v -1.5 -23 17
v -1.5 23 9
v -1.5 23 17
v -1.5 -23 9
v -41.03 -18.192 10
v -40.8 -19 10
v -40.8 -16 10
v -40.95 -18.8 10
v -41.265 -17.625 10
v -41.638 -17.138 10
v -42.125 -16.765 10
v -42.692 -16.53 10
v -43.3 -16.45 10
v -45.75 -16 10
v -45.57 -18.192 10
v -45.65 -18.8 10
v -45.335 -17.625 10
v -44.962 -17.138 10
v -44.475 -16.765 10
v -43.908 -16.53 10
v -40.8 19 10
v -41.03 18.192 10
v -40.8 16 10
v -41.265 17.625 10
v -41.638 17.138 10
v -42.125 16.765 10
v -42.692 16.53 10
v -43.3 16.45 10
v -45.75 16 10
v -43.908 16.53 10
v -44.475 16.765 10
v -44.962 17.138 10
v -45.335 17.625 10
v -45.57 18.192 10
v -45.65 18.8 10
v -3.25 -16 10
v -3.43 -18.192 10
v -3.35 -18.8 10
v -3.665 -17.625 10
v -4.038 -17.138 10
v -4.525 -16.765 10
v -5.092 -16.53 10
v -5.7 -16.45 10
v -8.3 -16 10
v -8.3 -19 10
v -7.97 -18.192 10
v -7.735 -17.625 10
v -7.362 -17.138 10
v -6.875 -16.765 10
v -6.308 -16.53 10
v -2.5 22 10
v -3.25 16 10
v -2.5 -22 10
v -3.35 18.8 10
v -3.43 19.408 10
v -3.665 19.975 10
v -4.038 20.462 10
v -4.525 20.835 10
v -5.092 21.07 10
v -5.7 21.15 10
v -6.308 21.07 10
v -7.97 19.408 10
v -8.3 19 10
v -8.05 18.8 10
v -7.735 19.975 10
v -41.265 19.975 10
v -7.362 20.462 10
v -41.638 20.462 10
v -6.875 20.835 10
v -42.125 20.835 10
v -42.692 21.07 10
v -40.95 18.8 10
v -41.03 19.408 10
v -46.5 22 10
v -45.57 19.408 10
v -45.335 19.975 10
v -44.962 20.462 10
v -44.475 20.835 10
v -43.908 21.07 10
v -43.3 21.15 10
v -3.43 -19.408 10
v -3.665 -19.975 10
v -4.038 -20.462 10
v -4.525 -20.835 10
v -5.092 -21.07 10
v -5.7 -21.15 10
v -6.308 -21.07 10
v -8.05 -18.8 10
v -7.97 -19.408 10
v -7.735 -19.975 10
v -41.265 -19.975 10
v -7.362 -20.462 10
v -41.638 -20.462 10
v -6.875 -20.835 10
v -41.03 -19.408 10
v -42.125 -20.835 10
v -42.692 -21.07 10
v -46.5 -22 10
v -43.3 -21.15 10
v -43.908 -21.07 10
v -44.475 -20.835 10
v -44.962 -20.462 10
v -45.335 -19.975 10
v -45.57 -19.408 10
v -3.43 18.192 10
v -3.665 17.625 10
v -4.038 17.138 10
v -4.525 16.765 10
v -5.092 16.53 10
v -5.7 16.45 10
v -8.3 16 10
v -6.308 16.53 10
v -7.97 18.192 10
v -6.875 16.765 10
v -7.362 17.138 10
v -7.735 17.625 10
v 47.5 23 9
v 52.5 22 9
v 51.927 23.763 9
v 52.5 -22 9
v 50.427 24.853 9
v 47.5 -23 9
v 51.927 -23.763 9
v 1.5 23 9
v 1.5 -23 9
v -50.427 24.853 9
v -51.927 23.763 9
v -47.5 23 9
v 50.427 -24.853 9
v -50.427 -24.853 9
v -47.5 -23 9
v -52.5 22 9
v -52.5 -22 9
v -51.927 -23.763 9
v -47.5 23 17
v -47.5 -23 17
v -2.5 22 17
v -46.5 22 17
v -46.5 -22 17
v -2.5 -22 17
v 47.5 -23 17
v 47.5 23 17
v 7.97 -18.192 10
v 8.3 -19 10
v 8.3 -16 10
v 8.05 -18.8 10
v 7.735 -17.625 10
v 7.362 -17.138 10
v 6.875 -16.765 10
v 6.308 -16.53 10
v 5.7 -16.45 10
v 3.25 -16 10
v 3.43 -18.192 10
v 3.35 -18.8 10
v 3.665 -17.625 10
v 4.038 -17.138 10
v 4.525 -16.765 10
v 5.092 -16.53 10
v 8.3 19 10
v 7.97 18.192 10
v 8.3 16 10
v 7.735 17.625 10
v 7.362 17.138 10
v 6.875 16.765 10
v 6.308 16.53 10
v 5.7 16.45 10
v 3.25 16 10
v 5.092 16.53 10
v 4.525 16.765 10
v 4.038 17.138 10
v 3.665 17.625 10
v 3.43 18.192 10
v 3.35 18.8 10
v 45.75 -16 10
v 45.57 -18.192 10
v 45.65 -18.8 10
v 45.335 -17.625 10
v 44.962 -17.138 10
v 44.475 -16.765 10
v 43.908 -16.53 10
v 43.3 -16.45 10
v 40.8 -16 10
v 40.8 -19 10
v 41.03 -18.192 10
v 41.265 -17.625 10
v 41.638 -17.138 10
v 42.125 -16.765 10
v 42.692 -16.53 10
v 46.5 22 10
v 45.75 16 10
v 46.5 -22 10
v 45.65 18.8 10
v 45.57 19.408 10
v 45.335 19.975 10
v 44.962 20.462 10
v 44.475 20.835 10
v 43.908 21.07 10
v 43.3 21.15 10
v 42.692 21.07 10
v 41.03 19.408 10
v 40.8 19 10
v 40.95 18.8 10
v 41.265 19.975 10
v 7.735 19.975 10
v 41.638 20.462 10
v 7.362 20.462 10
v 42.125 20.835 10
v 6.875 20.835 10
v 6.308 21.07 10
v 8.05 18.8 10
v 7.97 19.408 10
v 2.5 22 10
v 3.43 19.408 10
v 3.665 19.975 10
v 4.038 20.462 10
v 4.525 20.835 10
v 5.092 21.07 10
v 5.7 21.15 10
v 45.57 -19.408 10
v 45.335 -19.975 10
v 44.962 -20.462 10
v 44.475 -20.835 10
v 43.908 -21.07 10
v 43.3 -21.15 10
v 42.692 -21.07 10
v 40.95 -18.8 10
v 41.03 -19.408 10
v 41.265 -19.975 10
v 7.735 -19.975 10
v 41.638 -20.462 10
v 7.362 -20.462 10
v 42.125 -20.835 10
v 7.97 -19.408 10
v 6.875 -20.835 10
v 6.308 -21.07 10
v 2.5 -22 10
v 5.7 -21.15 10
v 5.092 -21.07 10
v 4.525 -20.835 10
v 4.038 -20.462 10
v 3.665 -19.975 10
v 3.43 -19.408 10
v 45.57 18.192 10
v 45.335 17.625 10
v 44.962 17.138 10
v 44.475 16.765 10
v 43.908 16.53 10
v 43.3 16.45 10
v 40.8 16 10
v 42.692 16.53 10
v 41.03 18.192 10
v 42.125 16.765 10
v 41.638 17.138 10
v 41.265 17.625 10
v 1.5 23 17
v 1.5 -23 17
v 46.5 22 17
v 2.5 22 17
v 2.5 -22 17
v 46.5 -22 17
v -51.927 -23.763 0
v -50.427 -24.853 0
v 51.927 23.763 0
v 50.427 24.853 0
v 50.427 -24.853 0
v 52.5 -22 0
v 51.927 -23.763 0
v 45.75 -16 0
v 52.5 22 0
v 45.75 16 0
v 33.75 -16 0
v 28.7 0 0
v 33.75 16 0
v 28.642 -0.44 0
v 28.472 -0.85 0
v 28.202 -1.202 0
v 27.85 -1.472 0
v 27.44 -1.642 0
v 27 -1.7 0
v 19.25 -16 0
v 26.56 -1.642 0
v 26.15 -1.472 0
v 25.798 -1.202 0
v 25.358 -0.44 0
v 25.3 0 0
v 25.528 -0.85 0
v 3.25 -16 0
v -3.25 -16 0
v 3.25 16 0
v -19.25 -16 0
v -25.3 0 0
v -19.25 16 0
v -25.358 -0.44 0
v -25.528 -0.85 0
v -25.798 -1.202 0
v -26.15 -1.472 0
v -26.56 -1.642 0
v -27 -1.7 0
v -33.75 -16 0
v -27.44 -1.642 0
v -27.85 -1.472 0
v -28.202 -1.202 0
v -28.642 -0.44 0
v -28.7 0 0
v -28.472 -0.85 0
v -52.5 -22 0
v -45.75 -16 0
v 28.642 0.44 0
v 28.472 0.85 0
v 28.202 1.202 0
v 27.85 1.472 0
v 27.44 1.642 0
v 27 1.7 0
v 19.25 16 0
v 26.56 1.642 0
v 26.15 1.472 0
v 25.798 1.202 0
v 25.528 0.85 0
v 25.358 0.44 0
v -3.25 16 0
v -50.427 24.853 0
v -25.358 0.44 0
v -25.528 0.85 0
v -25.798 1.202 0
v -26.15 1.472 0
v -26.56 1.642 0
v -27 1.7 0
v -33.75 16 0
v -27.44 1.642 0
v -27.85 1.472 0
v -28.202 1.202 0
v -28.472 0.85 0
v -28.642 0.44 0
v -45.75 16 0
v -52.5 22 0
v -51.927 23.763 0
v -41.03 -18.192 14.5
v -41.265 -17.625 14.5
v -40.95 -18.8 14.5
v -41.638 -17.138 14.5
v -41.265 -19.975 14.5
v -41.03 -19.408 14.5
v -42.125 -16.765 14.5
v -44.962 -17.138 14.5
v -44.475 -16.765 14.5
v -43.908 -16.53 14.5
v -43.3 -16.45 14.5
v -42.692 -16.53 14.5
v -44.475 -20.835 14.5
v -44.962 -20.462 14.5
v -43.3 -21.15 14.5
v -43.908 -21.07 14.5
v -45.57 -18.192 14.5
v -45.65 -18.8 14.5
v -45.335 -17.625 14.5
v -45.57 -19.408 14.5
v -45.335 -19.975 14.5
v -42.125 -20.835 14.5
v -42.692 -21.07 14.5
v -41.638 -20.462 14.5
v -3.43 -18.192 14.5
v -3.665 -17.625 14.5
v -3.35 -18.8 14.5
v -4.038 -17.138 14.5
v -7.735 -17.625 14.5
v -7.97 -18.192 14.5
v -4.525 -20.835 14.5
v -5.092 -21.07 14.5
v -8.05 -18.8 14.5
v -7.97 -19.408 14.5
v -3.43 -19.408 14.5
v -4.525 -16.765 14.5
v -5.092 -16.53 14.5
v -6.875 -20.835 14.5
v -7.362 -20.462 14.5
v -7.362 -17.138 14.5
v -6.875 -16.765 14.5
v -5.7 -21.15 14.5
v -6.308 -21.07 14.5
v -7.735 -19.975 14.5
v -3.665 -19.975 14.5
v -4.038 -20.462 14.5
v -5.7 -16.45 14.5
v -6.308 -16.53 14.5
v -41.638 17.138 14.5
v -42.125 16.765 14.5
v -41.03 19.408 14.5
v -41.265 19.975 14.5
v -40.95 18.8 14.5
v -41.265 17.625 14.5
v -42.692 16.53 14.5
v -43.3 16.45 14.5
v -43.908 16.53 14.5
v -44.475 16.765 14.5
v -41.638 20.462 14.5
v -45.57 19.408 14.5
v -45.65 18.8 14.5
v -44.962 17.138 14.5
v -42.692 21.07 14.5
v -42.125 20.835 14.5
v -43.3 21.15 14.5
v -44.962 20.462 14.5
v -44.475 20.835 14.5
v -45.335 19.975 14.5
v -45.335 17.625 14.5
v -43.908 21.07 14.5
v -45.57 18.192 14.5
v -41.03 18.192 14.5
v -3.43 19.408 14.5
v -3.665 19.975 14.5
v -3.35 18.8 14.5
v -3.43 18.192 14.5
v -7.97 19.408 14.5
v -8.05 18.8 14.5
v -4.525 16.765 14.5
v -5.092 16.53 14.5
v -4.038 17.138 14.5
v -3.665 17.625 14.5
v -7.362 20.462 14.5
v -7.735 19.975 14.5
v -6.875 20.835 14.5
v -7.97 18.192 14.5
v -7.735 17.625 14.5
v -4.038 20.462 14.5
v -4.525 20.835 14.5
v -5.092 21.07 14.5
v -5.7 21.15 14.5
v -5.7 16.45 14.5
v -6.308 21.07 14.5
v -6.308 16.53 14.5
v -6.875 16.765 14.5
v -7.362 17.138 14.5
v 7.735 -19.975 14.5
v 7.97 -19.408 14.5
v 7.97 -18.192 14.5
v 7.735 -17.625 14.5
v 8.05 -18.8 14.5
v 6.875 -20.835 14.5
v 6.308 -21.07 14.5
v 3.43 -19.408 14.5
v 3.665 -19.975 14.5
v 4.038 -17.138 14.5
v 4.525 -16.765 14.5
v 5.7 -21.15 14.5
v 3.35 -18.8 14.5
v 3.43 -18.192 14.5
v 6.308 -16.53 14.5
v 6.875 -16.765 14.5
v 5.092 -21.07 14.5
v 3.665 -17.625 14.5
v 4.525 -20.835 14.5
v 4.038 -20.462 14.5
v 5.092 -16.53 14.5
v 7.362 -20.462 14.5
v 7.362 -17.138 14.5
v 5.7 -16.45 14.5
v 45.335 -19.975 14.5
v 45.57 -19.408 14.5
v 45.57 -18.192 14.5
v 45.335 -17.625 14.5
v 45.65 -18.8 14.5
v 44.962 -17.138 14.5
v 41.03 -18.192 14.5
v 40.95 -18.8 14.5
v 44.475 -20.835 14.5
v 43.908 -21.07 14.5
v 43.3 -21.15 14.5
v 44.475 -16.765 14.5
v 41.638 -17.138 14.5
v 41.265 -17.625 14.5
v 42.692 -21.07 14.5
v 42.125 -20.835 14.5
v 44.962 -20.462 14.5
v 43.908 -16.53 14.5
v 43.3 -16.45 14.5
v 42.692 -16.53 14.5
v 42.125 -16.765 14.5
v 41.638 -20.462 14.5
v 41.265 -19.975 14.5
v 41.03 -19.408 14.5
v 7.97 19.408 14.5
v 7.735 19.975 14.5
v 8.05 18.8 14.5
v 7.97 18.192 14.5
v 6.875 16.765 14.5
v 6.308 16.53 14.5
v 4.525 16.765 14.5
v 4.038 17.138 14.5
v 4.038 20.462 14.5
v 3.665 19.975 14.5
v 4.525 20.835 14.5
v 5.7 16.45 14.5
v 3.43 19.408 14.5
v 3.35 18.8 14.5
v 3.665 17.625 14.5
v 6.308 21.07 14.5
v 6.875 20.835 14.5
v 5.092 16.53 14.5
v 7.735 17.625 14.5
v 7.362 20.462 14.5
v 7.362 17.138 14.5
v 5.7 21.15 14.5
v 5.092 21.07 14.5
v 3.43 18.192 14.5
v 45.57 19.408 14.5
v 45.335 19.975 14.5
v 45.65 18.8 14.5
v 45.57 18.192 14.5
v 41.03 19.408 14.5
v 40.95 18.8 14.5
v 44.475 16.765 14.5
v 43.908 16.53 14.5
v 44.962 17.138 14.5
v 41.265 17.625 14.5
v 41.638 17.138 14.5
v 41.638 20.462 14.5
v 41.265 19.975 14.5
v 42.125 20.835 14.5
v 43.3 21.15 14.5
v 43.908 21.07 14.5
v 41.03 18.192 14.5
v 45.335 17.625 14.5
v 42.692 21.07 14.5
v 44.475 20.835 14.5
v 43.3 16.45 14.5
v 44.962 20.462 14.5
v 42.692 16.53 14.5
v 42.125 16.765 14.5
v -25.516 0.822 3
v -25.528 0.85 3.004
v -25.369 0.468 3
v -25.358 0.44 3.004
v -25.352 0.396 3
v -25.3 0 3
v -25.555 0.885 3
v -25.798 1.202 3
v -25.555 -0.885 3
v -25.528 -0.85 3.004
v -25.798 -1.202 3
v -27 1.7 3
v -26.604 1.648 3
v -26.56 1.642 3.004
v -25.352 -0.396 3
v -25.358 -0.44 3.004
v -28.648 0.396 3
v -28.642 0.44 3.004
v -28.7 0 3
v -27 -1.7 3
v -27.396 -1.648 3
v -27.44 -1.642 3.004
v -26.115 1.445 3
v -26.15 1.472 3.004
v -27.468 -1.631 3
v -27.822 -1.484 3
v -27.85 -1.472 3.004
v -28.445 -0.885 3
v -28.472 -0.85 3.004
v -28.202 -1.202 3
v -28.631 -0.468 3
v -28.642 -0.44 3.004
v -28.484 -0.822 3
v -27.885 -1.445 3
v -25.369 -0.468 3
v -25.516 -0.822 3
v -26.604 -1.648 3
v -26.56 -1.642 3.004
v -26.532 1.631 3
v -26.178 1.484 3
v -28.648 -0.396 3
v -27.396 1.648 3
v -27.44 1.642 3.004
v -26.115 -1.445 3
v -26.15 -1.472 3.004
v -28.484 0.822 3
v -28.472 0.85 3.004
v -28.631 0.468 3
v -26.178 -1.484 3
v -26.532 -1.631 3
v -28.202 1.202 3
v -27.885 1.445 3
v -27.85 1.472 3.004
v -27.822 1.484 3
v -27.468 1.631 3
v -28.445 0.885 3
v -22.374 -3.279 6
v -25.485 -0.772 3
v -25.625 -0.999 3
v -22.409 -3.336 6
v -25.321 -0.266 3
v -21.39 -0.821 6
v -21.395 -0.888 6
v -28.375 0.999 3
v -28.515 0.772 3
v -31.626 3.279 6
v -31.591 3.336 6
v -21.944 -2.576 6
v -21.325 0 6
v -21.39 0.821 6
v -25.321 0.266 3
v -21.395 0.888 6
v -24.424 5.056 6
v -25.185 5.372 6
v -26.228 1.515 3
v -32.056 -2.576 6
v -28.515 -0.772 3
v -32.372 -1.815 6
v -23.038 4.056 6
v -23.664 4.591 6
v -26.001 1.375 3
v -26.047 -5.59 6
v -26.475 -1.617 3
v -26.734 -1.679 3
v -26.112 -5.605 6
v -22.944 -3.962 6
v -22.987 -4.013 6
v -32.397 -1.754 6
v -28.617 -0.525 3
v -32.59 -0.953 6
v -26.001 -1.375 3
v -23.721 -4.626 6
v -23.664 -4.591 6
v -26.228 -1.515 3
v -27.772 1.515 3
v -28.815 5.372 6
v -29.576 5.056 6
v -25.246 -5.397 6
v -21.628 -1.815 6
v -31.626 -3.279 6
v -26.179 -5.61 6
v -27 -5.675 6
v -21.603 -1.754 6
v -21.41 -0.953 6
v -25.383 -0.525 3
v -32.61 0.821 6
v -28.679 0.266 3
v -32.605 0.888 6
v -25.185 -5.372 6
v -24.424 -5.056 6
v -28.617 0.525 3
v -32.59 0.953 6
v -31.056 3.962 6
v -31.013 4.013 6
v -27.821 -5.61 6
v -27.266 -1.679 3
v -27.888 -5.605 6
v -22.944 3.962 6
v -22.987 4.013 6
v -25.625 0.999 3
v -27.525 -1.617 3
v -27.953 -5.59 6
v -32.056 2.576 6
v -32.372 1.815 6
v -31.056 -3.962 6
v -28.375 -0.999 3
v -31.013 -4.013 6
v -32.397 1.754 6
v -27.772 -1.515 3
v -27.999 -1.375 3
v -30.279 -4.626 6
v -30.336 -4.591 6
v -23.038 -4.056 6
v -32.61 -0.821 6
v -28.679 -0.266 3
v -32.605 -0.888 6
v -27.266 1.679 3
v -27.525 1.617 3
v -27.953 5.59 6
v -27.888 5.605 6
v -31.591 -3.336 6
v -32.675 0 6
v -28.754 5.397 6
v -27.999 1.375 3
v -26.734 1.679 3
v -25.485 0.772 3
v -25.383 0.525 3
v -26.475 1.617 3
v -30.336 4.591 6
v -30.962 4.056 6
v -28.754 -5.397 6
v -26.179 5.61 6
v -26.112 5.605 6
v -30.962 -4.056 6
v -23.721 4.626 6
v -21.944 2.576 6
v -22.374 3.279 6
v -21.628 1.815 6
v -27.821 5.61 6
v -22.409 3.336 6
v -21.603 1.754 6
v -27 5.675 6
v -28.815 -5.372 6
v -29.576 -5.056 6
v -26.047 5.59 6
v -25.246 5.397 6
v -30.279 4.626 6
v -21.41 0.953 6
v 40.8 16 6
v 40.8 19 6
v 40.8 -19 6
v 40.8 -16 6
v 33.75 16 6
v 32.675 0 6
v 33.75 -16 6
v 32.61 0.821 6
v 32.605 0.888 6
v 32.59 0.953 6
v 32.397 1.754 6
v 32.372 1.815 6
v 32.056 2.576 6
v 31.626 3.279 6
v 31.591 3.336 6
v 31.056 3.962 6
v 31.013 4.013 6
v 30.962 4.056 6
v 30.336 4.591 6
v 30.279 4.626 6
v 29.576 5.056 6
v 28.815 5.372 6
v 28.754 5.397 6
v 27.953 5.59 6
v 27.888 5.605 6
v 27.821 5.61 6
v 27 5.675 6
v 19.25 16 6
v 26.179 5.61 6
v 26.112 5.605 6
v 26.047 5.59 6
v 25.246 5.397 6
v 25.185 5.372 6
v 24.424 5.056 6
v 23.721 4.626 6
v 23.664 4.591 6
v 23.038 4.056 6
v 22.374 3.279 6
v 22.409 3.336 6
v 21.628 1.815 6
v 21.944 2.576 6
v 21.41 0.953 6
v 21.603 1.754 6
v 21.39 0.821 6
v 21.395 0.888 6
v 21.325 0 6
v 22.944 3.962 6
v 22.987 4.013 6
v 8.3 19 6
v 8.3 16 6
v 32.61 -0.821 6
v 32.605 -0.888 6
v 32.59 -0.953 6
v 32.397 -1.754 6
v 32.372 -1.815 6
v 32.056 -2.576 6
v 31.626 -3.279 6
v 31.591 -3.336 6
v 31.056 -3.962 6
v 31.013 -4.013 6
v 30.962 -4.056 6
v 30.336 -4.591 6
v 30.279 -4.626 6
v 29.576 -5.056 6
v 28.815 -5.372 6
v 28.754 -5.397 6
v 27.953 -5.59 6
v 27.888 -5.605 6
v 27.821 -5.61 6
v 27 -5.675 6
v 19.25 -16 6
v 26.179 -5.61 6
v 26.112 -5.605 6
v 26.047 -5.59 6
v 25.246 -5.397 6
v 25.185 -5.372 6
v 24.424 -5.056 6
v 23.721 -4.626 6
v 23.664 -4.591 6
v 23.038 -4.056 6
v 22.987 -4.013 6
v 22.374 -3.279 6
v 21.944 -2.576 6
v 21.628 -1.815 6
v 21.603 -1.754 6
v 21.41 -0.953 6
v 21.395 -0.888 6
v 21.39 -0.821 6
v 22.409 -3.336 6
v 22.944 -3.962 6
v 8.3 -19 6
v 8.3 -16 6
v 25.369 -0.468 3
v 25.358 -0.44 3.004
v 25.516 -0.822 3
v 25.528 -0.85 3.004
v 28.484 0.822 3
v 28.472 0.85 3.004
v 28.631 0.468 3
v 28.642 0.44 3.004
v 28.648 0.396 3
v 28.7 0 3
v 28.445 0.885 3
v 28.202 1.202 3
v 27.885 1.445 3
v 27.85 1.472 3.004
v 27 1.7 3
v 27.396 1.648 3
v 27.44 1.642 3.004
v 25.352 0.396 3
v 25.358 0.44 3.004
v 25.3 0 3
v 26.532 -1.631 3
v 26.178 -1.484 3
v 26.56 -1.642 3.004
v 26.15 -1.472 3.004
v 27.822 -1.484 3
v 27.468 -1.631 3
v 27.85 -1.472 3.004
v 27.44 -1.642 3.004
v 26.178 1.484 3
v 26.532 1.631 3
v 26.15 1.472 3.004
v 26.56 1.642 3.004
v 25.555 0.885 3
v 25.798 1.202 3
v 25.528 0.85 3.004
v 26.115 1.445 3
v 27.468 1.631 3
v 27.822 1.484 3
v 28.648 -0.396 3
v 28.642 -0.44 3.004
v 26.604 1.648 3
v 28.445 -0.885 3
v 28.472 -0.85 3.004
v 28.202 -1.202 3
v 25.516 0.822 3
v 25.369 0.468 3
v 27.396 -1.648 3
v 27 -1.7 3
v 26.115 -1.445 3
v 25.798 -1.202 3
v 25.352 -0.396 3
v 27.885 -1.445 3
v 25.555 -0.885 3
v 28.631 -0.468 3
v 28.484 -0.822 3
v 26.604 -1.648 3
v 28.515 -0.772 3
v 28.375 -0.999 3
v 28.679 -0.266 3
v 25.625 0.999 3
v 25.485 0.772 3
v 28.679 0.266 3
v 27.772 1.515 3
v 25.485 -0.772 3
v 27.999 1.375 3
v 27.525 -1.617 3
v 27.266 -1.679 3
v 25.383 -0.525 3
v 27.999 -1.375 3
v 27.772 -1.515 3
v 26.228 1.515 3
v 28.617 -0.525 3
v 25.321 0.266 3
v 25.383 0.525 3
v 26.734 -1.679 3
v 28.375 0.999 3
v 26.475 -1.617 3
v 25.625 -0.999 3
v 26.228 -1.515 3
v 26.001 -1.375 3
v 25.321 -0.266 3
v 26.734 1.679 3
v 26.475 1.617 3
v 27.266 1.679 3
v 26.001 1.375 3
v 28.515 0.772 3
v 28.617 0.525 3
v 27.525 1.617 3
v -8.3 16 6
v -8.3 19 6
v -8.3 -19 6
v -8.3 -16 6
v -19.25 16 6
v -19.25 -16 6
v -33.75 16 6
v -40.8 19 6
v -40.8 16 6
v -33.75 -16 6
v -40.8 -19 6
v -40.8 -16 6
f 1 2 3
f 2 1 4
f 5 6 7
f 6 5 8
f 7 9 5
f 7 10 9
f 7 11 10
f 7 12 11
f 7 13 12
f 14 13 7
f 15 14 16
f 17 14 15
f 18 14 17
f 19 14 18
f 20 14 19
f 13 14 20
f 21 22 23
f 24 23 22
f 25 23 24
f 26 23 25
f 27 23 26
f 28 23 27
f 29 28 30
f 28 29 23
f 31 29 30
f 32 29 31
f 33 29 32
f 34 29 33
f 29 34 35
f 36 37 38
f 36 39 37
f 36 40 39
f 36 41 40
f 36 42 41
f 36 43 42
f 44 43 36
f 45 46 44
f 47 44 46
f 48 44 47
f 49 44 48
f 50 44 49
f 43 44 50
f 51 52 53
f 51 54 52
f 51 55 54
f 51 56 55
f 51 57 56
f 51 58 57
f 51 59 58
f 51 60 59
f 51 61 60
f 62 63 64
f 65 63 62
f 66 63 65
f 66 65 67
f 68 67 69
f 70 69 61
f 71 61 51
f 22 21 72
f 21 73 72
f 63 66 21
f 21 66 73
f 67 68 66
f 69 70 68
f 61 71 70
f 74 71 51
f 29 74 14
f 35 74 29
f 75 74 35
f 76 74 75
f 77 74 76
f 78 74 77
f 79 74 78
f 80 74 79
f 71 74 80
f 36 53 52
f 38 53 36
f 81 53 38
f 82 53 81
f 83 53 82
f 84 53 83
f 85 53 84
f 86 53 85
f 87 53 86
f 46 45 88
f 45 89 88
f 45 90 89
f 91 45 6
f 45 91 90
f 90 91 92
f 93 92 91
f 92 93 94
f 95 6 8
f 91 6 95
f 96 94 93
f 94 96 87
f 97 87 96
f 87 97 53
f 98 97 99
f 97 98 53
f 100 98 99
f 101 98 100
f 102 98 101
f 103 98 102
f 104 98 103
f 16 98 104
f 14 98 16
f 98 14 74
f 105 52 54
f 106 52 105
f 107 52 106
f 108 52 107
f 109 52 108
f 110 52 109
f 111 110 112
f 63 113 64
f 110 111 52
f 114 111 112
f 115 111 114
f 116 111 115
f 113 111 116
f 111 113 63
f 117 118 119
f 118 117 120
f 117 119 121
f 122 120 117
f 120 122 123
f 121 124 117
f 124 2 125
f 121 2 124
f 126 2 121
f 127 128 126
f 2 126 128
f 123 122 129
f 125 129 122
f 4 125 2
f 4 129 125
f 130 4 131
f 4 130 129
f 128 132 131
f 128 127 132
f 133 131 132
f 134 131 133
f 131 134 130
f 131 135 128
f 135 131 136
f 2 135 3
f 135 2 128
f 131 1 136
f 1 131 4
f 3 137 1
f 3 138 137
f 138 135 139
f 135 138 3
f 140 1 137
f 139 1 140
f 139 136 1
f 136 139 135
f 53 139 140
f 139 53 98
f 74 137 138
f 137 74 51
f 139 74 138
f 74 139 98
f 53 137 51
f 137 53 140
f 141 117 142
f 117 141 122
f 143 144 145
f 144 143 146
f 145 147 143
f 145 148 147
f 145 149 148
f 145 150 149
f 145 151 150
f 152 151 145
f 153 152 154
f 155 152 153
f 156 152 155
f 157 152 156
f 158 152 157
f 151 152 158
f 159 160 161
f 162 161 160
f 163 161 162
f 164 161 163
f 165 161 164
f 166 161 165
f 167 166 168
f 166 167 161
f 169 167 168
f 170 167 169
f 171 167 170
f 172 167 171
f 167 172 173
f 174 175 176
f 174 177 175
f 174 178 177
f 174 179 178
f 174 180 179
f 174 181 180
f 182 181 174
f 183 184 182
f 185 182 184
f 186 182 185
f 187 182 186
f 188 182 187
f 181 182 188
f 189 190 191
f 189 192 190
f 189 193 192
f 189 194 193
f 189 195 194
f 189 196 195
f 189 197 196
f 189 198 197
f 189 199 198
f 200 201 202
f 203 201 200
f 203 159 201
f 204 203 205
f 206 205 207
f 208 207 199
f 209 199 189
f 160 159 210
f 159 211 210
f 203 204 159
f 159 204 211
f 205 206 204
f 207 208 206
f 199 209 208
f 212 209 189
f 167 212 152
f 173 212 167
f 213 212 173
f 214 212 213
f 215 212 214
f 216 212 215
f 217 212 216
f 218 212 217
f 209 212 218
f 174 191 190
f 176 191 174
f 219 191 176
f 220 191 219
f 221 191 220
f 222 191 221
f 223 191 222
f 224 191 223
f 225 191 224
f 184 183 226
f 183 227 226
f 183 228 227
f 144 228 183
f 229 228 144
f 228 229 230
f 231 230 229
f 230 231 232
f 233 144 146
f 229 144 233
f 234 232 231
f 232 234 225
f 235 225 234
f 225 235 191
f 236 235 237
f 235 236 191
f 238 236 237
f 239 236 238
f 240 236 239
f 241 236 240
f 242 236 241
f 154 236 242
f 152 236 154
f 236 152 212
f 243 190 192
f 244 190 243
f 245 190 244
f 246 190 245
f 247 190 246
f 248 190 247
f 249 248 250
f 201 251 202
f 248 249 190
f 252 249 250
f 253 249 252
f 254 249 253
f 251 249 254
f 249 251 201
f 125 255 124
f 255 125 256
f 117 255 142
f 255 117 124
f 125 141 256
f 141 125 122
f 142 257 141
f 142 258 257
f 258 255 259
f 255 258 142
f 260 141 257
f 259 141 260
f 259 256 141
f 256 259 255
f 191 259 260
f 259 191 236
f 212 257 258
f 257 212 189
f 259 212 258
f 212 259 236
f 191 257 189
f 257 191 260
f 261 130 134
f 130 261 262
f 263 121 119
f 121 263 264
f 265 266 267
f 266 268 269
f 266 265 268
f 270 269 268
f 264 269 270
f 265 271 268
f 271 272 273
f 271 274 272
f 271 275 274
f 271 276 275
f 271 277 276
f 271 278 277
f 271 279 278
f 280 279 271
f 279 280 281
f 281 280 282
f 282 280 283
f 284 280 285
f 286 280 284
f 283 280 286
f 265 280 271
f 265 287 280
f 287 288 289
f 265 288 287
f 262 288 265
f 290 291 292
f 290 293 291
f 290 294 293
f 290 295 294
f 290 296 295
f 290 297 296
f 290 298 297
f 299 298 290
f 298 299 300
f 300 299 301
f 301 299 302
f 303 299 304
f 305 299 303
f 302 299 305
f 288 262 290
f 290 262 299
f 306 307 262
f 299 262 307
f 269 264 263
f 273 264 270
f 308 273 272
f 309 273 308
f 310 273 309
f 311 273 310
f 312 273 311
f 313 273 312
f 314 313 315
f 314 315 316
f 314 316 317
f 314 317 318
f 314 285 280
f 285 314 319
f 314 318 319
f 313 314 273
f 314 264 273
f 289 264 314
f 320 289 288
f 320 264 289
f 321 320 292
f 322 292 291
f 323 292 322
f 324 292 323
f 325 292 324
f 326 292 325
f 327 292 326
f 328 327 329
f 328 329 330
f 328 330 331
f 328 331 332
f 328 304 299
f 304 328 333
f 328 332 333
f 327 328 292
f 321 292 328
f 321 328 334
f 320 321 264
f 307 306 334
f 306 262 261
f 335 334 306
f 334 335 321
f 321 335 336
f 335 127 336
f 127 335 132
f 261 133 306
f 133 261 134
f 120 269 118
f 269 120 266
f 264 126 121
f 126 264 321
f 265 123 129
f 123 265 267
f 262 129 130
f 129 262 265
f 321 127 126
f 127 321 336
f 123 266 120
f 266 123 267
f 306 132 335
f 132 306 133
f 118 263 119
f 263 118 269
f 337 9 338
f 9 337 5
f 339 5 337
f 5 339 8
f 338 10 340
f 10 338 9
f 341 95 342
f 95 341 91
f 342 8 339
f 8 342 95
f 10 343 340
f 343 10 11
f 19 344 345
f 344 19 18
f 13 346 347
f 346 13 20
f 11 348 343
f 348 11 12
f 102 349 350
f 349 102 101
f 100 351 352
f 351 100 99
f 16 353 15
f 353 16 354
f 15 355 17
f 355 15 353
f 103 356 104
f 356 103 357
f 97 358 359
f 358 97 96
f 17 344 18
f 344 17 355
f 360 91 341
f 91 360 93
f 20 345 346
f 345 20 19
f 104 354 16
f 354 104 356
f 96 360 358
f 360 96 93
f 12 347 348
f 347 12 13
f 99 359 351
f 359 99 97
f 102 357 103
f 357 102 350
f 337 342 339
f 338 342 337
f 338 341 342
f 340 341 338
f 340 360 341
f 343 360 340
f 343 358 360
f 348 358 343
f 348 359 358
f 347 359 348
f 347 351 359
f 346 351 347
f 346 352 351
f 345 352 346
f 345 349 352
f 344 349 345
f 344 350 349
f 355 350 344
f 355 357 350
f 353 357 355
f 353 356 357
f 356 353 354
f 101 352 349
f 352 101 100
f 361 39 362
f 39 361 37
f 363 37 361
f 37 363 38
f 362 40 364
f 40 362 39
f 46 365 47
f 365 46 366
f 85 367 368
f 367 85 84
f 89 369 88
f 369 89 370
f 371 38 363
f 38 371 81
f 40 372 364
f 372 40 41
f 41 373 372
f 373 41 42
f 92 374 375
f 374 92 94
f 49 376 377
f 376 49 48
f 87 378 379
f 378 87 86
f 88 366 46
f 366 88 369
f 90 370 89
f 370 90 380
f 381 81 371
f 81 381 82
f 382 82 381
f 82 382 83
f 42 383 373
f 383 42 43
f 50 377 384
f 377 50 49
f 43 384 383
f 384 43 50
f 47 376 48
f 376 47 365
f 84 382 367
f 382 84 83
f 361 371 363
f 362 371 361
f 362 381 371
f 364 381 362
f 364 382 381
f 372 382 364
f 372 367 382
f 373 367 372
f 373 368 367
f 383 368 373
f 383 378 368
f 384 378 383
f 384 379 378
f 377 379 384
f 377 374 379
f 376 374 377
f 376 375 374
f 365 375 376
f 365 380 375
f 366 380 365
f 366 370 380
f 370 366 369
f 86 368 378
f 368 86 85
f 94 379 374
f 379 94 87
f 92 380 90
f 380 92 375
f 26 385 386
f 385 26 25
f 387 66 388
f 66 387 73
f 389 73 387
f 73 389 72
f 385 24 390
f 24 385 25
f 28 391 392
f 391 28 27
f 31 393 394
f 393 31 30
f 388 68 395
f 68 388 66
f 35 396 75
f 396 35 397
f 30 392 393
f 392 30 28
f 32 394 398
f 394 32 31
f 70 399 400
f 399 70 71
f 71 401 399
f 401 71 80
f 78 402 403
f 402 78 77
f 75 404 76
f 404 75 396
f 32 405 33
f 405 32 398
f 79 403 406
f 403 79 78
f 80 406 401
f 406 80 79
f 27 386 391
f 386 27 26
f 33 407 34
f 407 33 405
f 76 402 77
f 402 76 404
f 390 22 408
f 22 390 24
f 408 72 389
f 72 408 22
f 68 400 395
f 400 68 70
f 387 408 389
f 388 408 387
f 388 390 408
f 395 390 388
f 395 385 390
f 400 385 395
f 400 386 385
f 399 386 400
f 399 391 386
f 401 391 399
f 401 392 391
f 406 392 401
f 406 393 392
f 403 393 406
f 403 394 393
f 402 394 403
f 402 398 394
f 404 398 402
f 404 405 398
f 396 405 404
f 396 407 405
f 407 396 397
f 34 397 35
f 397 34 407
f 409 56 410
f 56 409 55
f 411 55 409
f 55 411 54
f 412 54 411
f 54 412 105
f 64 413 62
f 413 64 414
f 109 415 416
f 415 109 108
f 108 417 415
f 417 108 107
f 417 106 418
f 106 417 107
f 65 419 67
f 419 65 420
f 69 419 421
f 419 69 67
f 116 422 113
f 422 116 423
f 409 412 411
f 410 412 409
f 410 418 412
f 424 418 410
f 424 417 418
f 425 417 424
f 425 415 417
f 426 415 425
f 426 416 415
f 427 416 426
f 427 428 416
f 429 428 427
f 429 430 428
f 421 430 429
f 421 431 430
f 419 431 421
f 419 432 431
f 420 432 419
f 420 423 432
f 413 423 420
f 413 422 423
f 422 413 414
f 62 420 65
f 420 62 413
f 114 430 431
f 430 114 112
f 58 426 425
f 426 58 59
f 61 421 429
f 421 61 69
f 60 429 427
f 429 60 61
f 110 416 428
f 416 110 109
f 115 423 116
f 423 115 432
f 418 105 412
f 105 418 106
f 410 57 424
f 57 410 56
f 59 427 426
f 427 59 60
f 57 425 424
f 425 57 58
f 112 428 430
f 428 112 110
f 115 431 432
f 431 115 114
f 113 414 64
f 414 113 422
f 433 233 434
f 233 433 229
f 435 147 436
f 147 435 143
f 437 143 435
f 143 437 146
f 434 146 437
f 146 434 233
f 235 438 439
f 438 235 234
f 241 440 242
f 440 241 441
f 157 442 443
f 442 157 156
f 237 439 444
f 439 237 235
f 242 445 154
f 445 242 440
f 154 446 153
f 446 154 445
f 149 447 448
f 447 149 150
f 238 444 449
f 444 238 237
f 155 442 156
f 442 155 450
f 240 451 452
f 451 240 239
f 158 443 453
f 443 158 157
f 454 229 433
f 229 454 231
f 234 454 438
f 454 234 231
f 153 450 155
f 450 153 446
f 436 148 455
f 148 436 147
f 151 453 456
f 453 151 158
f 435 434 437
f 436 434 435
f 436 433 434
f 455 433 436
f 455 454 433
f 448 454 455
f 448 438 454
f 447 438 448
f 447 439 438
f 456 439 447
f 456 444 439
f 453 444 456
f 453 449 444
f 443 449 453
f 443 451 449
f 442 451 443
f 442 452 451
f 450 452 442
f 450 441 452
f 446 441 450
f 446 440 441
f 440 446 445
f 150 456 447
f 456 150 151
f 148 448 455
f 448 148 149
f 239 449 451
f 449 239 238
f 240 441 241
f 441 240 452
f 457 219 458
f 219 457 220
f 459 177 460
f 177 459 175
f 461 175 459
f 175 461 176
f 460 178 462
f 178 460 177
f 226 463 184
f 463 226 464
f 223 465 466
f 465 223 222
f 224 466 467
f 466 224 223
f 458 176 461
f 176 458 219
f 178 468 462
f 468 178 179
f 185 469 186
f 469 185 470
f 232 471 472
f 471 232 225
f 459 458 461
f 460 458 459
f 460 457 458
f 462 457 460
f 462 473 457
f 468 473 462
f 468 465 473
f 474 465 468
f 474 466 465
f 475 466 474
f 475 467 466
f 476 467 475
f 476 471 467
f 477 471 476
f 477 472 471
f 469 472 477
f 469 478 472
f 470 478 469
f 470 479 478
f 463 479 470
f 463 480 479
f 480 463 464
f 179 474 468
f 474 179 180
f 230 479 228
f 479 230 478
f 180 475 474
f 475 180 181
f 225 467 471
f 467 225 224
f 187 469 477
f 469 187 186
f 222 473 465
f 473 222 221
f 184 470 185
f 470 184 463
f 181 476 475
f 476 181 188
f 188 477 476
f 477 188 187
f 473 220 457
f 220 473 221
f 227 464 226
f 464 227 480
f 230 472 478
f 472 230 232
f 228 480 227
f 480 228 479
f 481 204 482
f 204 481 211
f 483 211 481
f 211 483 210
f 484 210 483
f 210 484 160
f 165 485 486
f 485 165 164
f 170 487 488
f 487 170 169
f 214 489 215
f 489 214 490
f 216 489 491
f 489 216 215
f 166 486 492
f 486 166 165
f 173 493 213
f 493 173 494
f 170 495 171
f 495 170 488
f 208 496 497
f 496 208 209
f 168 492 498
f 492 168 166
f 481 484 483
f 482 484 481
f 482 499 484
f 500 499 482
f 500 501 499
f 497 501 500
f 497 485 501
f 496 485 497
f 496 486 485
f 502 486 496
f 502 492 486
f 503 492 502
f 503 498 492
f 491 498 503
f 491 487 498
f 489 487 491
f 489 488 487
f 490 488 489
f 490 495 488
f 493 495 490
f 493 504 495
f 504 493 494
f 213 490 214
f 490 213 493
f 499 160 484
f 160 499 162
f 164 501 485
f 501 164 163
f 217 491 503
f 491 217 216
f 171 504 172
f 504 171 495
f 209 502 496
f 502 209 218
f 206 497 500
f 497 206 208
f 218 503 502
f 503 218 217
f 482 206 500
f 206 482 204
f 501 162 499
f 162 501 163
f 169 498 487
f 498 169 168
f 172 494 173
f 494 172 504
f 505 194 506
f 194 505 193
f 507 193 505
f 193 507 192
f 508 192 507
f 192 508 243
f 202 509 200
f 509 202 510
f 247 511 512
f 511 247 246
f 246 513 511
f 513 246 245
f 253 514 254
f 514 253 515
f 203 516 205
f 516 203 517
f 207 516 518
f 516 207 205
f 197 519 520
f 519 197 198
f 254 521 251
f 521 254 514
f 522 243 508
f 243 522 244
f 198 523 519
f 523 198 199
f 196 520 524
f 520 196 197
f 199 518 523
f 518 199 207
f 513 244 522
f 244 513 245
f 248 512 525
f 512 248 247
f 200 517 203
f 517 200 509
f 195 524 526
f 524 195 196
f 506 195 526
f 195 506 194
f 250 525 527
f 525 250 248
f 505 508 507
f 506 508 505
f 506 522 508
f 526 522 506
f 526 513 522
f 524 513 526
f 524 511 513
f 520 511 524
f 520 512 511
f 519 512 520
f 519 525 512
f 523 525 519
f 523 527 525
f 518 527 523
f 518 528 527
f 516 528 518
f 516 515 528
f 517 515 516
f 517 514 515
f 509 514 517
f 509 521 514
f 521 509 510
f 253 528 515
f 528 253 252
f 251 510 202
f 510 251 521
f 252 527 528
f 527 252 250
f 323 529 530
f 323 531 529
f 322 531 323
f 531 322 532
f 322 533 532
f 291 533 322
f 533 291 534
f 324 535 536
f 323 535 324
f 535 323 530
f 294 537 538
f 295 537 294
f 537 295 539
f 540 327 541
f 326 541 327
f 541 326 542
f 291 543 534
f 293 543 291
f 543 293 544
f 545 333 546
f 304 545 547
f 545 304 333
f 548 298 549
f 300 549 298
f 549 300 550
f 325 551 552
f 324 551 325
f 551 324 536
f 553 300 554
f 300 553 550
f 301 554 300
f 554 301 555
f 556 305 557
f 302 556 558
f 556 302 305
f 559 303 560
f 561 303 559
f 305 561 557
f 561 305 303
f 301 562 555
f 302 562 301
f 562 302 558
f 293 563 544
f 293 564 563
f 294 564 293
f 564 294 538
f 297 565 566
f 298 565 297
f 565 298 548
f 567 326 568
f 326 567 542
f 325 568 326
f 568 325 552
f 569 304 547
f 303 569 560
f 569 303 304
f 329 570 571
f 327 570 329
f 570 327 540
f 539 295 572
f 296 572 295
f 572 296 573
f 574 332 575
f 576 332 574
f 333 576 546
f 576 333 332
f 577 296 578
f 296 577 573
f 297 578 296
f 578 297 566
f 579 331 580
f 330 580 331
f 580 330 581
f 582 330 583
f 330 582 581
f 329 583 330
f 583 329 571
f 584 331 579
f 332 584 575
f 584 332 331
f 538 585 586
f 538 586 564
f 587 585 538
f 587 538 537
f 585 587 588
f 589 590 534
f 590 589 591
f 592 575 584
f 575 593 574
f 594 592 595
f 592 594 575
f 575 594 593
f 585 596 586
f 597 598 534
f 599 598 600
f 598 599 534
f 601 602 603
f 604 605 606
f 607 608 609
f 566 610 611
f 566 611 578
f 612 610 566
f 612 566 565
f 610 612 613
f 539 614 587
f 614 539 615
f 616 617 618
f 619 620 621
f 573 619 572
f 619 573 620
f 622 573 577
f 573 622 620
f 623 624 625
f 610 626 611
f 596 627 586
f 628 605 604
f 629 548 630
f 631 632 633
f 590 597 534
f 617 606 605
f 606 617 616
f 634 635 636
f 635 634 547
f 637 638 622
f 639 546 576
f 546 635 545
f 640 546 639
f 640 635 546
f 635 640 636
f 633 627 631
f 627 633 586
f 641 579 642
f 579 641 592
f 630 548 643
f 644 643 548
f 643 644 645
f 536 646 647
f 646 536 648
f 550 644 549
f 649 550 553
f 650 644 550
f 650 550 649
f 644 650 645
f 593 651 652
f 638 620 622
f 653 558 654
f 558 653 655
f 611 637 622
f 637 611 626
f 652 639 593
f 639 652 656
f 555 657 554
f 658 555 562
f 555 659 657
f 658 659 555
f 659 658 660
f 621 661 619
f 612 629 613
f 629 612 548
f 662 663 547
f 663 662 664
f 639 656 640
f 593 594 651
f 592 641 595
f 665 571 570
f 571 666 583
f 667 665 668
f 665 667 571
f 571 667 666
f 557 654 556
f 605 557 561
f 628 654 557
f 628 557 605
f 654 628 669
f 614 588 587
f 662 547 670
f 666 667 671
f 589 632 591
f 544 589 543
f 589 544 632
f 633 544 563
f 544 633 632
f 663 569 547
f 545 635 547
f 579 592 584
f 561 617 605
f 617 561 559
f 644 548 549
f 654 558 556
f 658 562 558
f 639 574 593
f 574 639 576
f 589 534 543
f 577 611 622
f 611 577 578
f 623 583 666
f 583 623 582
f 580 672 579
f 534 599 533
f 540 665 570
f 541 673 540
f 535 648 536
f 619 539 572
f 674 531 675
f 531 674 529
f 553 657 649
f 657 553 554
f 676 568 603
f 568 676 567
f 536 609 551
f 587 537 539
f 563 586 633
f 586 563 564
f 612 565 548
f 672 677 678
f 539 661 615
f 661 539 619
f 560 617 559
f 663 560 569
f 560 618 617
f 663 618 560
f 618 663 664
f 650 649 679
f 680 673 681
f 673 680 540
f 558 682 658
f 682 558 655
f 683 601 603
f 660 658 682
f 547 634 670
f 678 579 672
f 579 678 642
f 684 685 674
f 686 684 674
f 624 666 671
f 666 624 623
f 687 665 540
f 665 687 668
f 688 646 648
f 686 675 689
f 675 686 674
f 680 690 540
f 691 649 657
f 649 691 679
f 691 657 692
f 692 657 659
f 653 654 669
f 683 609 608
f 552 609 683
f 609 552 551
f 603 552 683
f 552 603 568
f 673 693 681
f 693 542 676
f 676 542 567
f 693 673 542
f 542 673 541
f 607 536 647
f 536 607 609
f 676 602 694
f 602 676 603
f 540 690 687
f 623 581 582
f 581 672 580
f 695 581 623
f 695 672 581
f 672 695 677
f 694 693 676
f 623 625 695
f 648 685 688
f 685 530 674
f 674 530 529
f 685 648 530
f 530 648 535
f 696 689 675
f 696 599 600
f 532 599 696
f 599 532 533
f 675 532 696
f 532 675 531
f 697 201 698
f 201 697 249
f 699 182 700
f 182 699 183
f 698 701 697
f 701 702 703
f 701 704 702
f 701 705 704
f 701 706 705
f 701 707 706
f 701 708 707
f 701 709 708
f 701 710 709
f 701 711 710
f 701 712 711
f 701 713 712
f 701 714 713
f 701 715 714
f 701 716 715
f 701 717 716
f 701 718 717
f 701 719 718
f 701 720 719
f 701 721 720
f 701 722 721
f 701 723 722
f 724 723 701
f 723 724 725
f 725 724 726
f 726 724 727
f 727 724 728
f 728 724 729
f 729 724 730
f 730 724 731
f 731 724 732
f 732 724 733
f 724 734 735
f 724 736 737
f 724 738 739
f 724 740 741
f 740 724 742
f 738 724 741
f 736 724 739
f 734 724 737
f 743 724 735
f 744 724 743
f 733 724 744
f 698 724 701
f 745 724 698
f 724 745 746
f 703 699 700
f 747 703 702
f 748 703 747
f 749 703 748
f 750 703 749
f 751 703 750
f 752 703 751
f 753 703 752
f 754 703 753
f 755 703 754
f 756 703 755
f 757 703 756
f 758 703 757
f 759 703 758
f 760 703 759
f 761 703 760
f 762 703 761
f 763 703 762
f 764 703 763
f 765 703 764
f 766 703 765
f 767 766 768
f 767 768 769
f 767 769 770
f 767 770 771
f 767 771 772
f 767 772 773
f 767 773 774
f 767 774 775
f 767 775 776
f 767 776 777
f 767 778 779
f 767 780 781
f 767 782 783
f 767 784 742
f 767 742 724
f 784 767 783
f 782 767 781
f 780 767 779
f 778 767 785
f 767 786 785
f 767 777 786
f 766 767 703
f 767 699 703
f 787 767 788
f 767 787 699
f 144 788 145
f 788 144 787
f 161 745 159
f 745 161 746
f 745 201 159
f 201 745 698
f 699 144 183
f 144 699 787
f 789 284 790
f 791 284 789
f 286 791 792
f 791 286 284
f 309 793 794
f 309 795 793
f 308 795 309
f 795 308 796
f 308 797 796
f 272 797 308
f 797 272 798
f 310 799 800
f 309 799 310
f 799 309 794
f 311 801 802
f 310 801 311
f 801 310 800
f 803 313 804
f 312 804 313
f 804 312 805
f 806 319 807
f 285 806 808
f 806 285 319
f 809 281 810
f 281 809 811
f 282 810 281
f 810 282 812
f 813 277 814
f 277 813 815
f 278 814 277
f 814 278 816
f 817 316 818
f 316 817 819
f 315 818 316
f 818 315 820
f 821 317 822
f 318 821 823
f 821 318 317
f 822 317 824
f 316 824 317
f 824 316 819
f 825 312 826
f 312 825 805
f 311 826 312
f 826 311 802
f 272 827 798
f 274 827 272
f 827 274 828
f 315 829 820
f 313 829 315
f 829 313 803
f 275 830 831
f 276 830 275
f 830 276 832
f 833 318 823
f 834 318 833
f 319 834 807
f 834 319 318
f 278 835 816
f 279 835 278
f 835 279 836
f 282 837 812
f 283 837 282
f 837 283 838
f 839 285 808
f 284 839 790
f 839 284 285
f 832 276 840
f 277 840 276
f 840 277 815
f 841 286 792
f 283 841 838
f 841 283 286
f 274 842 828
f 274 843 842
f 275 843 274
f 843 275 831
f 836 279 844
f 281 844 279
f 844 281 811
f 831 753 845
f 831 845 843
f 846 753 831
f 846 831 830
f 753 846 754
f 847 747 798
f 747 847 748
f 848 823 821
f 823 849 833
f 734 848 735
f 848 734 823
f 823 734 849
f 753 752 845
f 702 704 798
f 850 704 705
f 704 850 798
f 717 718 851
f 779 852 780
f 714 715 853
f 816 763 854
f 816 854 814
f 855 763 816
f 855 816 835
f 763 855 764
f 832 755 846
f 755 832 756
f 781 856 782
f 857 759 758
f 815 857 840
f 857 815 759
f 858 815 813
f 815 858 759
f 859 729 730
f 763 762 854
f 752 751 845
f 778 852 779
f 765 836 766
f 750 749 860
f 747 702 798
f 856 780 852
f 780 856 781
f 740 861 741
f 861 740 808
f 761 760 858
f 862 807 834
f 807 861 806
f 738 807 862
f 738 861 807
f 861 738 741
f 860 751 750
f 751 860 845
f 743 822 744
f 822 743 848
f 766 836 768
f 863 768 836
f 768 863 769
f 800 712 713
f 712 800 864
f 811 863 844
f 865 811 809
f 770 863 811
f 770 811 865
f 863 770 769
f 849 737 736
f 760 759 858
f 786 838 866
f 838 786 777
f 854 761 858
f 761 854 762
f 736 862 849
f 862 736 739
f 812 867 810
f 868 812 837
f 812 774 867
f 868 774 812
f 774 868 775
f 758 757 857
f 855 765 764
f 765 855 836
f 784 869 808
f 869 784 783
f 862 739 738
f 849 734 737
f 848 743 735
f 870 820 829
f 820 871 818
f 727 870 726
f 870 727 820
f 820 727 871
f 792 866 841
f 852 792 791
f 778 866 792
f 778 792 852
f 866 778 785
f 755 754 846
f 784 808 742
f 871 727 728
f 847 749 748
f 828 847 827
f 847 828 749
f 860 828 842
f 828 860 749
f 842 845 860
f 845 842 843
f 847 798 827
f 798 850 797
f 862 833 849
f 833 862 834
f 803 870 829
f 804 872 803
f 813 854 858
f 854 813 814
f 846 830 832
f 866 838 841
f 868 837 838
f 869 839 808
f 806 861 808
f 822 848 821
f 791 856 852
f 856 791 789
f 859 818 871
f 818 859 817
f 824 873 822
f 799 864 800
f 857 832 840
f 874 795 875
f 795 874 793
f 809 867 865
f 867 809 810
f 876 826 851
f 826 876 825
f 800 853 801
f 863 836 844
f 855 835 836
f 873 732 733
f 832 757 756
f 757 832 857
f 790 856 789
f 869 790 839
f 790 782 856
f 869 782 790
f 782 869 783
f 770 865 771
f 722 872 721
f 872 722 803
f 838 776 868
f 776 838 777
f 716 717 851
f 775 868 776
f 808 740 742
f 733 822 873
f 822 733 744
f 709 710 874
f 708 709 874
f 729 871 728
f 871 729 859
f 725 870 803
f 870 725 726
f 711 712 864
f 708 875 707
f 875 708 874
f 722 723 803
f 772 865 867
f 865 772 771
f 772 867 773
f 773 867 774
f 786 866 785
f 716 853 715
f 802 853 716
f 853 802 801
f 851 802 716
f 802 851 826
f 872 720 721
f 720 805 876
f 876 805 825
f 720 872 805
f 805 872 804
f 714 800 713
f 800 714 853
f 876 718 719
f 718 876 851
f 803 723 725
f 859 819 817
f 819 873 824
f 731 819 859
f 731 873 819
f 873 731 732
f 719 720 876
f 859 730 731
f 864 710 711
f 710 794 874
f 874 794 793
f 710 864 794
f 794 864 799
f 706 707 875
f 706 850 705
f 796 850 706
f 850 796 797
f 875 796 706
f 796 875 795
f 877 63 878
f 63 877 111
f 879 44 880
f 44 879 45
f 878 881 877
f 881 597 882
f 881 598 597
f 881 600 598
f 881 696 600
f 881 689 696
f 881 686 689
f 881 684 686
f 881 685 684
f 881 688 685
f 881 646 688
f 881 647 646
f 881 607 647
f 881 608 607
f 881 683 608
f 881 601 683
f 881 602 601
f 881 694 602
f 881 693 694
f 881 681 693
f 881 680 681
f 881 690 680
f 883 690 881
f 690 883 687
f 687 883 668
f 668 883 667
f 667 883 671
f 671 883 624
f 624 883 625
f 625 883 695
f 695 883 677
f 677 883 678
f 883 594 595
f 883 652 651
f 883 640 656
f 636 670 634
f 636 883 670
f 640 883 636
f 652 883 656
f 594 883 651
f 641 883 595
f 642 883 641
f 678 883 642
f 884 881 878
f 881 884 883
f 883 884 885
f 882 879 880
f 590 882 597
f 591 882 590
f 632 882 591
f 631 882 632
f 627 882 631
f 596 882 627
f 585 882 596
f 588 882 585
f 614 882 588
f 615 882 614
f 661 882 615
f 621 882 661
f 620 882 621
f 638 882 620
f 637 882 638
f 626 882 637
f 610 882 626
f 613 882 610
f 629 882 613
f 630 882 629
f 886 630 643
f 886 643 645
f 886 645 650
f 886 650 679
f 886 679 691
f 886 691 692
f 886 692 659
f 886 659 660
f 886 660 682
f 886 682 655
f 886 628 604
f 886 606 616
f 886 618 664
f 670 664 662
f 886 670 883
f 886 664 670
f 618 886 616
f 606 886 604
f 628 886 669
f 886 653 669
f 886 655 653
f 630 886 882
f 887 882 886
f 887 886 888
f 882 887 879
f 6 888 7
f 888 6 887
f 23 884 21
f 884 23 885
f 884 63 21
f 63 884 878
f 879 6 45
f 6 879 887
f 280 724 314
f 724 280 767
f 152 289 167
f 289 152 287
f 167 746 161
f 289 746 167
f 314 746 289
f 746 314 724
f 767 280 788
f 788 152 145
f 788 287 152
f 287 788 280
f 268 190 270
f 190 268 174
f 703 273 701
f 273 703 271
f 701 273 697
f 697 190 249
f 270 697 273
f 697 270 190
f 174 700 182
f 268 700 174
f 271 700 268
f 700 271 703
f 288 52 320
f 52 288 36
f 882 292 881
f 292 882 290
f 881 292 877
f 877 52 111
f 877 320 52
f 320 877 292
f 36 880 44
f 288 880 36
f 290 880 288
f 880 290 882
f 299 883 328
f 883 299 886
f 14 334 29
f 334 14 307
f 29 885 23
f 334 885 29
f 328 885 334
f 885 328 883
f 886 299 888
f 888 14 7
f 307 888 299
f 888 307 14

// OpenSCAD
// Raspberry Pi Car Motor Controller Mount
// For two 43mm x 43mm motor controllers

mc_width = 46;
mc_length = 46;
mc_hole_inset = 4.2;  
mc_hole_diameter = 4.7;

// Base plate dimensions
base_length = 105; // Enough for two controllers plus spacing
base_width = 50;
base_thickness = 9;

// column cylinders height from wall

clearance_columns = -2.5;

// Car mounting
car_mount_hole_distance = 54; // Distance between car mounting points
car_mount_hole_diameter = 3.4; // M2.5 with slight tolerance
car_mount_countersink_diameter = 14; // Diameter of countersink
car_mount_countersink_depth = 4; // Depth of countersink

// Additional parameters
spacing_between_controllers = 3; // Space between the two controllers
wall_height = 8; // Height of walls for stability
corner_radius = 3; // Rounded corners

module roundedRect(size, radius) {
    x = size[0];
    y = size[1];
    z = size[2];
    
    linear_extrude(height=z)
    hull() {
        // Place circles at the four corners
        translate([radius, radius, 0])
        circle(r=radius);
        
        translate([x-radius, radius, 0])
        circle(r=radius);
        
        translate([x-radius, y-radius, 0])
        circle(r=radius);
        
        translate([radius, y-radius, 0])
        circle(r=radius);
    }
}

// Motor controller mounting section - now centered
module motorControllerMount() {
    // Calculate total width needed for controllers
    total_controllers_width = 2 * mc_length + spacing_between_controllers;
    // Calculate offset to center controllers
    controller_x_offset = (base_length - total_controllers_width) / 2;
    
    difference() {
        union() {
            // Base plate with rounded corners
            // Center everything relative to origin
            translate([-base_length/2, -base_width/2, 0])
            roundedRect([base_length, base_width, base_thickness], corner_radius);
            
            // First controller platform - centered
            translate([-(total_controllers_width/2), -mc_width/2, base_thickness]) {
                // Platform
                cube([mc_length, mc_width, 1]);
                
                // Walls for stability
                cube([mc_length, 1, wall_height]);
                
                translate([0, mc_width-1, 0])
                cube([mc_length, 1, wall_height]);
                
                translate([0, 0, 0])
                cube([1, mc_width, wall_height]);
                
                translate([mc_length-1, 0, 0])
                cube([1, mc_width, wall_height]);
            }
            
            // Second controller platform - centered
            translate([spacing_between_controllers/2, -mc_width/2, base_thickness]) {
                // Platform
                cube([mc_length, mc_width, 1]);
                
                // Walls for stability
                cube([mc_length, 1, wall_height]);
                
                translate([0, mc_width-1, 0])
                cube([mc_length, 1, wall_height]);
                
                translate([0, 0, 0])
                cube([1, mc_width, wall_height]);
                
                translate([mc_length-1, 0, 0])
                cube([1, mc_width, wall_height]);
            }
            
            // First controllers standing columns
            
            translate([-(total_controllers_width/2) + mc_hole_inset, -mc_width/2 + mc_hole_inset, 0])
        cylinder(h=base_thickness+wall_height+clearance_columns, d=mc_hole_diameter, $fn=24);
            
            translate([-(total_controllers_width/2) + mc_length-mc_hole_inset, -mc_width/2 + mc_hole_inset, 0])
        cylinder(h=base_thickness+wall_height+clearance_columns, d=mc_hole_diameter, $fn=24);
        
        translate([-(total_controllers_width/2) + mc_hole_inset, mc_width/2 - mc_hole_inset, 0])
        cylinder(h=base_thickness+wall_height+clearance_columns, d=mc_hole_diameter, $fn=24);
        
        translate([-(total_controllers_width/2) + mc_length-mc_hole_inset, mc_width/2 - mc_hole_inset, 0])
        cylinder(h=base_thickness+wall_height+clearance_columns, d=mc_hole_diameter, $fn=24);
            
           // Second controllers standing columns
        
         translate([spacing_between_controllers/2 + mc_hole_inset, -mc_width/2 + mc_hole_inset, 0])
        cylinder(h=base_thickness+wall_height+clearance_columns, d=mc_hole_diameter, $fn=24);
        
        translate([spacing_between_controllers/2 + mc_length-mc_hole_inset, -mc_width/2 + mc_hole_inset, 0])
        cylinder(h=base_thickness+wall_height+clearance_columns, d=mc_hole_diameter, $fn=24);
        
        translate([spacing_between_controllers/2 + mc_hole_inset, mc_width/2 - mc_hole_inset, 0])
        cylinder(h=base_thickness+wall_height+clearance_columns, d=mc_hole_diameter, $fn=24);
        
        translate([spacing_between_controllers/2 + mc_length-mc_hole_inset, mc_width/2 - mc_hole_inset, 0])
        cylinder(h=base_thickness+wall_height+clearance_columns, d=mc_hole_diameter, $fn=24); 
           
        
}
        
        
        
        // Car mounting holes with countersinks using simple cylinders
        // First mounting hole - through hole
        translate([-car_mount_hole_distance/2, 0, -1])
        cylinder(h=base_thickness+wall_height, d=car_mount_hole_diameter, $fn=24);
        
        // First mounting hole - countersink on top surface
translate([-car_mount_hole_distance/2, 0, base_thickness-6])
cylinder(h=car_mount_countersink_depth, d1=car_mount_hole_diameter, d2=car_mount_countersink_diameter, $fn=40);
        
        // countersink for the pins coming out of the bottom of the controllers
        
        translate([base_length/4 - 1.7, 0, base_thickness])
        cube([32.5, 38, 6], center = true);
        
        // Second mounting hole - through hole
        translate([car_mount_hole_distance/2, 0, -1])
        cylinder(h=base_thickness+wall_height+10, d=car_mount_hole_diameter, $fn=24);
        
        // Second mounting hole - CORRECTED countersink on top surface
translate([car_mount_hole_distance/2, 0, base_thickness-6])
cylinder(h=car_mount_countersink_depth, d1=car_mount_hole_diameter, d2=car_mount_countersink_diameter, $fn=40);

        // countersink for the second mounting area
        
        translate([-base_length/4 + 1.7, 0, base_thickness])
        cube([32.5, 38, 6], center = true);
        
        // Add ventilation holes under the platform
// First side
translate([base_length/4 - 15, 0, -1])
cube([16, 32, base_thickness+30], center = true);

translate([base_length/4 + 13.5, 0, -1])
cube([12, 32, base_thickness+30], center = true);

// Second side

translate([-base_length/4 + 15, 0, -1])
cube([16, 32, base_thickness+30], center = true);

translate([-base_length/4 - 13.5, 0, -1])
cube([12, 32, base_thickness+30], center = true);




    }
}

//intersection() {
    motorControllerMount();
    //This creates a cutting plane that passes through both mounting holes
    //translate([-car_mount_hole_distance/2, -25, -1])
    //cube([car_mount_hole_distance, 50, 20]);
//}
